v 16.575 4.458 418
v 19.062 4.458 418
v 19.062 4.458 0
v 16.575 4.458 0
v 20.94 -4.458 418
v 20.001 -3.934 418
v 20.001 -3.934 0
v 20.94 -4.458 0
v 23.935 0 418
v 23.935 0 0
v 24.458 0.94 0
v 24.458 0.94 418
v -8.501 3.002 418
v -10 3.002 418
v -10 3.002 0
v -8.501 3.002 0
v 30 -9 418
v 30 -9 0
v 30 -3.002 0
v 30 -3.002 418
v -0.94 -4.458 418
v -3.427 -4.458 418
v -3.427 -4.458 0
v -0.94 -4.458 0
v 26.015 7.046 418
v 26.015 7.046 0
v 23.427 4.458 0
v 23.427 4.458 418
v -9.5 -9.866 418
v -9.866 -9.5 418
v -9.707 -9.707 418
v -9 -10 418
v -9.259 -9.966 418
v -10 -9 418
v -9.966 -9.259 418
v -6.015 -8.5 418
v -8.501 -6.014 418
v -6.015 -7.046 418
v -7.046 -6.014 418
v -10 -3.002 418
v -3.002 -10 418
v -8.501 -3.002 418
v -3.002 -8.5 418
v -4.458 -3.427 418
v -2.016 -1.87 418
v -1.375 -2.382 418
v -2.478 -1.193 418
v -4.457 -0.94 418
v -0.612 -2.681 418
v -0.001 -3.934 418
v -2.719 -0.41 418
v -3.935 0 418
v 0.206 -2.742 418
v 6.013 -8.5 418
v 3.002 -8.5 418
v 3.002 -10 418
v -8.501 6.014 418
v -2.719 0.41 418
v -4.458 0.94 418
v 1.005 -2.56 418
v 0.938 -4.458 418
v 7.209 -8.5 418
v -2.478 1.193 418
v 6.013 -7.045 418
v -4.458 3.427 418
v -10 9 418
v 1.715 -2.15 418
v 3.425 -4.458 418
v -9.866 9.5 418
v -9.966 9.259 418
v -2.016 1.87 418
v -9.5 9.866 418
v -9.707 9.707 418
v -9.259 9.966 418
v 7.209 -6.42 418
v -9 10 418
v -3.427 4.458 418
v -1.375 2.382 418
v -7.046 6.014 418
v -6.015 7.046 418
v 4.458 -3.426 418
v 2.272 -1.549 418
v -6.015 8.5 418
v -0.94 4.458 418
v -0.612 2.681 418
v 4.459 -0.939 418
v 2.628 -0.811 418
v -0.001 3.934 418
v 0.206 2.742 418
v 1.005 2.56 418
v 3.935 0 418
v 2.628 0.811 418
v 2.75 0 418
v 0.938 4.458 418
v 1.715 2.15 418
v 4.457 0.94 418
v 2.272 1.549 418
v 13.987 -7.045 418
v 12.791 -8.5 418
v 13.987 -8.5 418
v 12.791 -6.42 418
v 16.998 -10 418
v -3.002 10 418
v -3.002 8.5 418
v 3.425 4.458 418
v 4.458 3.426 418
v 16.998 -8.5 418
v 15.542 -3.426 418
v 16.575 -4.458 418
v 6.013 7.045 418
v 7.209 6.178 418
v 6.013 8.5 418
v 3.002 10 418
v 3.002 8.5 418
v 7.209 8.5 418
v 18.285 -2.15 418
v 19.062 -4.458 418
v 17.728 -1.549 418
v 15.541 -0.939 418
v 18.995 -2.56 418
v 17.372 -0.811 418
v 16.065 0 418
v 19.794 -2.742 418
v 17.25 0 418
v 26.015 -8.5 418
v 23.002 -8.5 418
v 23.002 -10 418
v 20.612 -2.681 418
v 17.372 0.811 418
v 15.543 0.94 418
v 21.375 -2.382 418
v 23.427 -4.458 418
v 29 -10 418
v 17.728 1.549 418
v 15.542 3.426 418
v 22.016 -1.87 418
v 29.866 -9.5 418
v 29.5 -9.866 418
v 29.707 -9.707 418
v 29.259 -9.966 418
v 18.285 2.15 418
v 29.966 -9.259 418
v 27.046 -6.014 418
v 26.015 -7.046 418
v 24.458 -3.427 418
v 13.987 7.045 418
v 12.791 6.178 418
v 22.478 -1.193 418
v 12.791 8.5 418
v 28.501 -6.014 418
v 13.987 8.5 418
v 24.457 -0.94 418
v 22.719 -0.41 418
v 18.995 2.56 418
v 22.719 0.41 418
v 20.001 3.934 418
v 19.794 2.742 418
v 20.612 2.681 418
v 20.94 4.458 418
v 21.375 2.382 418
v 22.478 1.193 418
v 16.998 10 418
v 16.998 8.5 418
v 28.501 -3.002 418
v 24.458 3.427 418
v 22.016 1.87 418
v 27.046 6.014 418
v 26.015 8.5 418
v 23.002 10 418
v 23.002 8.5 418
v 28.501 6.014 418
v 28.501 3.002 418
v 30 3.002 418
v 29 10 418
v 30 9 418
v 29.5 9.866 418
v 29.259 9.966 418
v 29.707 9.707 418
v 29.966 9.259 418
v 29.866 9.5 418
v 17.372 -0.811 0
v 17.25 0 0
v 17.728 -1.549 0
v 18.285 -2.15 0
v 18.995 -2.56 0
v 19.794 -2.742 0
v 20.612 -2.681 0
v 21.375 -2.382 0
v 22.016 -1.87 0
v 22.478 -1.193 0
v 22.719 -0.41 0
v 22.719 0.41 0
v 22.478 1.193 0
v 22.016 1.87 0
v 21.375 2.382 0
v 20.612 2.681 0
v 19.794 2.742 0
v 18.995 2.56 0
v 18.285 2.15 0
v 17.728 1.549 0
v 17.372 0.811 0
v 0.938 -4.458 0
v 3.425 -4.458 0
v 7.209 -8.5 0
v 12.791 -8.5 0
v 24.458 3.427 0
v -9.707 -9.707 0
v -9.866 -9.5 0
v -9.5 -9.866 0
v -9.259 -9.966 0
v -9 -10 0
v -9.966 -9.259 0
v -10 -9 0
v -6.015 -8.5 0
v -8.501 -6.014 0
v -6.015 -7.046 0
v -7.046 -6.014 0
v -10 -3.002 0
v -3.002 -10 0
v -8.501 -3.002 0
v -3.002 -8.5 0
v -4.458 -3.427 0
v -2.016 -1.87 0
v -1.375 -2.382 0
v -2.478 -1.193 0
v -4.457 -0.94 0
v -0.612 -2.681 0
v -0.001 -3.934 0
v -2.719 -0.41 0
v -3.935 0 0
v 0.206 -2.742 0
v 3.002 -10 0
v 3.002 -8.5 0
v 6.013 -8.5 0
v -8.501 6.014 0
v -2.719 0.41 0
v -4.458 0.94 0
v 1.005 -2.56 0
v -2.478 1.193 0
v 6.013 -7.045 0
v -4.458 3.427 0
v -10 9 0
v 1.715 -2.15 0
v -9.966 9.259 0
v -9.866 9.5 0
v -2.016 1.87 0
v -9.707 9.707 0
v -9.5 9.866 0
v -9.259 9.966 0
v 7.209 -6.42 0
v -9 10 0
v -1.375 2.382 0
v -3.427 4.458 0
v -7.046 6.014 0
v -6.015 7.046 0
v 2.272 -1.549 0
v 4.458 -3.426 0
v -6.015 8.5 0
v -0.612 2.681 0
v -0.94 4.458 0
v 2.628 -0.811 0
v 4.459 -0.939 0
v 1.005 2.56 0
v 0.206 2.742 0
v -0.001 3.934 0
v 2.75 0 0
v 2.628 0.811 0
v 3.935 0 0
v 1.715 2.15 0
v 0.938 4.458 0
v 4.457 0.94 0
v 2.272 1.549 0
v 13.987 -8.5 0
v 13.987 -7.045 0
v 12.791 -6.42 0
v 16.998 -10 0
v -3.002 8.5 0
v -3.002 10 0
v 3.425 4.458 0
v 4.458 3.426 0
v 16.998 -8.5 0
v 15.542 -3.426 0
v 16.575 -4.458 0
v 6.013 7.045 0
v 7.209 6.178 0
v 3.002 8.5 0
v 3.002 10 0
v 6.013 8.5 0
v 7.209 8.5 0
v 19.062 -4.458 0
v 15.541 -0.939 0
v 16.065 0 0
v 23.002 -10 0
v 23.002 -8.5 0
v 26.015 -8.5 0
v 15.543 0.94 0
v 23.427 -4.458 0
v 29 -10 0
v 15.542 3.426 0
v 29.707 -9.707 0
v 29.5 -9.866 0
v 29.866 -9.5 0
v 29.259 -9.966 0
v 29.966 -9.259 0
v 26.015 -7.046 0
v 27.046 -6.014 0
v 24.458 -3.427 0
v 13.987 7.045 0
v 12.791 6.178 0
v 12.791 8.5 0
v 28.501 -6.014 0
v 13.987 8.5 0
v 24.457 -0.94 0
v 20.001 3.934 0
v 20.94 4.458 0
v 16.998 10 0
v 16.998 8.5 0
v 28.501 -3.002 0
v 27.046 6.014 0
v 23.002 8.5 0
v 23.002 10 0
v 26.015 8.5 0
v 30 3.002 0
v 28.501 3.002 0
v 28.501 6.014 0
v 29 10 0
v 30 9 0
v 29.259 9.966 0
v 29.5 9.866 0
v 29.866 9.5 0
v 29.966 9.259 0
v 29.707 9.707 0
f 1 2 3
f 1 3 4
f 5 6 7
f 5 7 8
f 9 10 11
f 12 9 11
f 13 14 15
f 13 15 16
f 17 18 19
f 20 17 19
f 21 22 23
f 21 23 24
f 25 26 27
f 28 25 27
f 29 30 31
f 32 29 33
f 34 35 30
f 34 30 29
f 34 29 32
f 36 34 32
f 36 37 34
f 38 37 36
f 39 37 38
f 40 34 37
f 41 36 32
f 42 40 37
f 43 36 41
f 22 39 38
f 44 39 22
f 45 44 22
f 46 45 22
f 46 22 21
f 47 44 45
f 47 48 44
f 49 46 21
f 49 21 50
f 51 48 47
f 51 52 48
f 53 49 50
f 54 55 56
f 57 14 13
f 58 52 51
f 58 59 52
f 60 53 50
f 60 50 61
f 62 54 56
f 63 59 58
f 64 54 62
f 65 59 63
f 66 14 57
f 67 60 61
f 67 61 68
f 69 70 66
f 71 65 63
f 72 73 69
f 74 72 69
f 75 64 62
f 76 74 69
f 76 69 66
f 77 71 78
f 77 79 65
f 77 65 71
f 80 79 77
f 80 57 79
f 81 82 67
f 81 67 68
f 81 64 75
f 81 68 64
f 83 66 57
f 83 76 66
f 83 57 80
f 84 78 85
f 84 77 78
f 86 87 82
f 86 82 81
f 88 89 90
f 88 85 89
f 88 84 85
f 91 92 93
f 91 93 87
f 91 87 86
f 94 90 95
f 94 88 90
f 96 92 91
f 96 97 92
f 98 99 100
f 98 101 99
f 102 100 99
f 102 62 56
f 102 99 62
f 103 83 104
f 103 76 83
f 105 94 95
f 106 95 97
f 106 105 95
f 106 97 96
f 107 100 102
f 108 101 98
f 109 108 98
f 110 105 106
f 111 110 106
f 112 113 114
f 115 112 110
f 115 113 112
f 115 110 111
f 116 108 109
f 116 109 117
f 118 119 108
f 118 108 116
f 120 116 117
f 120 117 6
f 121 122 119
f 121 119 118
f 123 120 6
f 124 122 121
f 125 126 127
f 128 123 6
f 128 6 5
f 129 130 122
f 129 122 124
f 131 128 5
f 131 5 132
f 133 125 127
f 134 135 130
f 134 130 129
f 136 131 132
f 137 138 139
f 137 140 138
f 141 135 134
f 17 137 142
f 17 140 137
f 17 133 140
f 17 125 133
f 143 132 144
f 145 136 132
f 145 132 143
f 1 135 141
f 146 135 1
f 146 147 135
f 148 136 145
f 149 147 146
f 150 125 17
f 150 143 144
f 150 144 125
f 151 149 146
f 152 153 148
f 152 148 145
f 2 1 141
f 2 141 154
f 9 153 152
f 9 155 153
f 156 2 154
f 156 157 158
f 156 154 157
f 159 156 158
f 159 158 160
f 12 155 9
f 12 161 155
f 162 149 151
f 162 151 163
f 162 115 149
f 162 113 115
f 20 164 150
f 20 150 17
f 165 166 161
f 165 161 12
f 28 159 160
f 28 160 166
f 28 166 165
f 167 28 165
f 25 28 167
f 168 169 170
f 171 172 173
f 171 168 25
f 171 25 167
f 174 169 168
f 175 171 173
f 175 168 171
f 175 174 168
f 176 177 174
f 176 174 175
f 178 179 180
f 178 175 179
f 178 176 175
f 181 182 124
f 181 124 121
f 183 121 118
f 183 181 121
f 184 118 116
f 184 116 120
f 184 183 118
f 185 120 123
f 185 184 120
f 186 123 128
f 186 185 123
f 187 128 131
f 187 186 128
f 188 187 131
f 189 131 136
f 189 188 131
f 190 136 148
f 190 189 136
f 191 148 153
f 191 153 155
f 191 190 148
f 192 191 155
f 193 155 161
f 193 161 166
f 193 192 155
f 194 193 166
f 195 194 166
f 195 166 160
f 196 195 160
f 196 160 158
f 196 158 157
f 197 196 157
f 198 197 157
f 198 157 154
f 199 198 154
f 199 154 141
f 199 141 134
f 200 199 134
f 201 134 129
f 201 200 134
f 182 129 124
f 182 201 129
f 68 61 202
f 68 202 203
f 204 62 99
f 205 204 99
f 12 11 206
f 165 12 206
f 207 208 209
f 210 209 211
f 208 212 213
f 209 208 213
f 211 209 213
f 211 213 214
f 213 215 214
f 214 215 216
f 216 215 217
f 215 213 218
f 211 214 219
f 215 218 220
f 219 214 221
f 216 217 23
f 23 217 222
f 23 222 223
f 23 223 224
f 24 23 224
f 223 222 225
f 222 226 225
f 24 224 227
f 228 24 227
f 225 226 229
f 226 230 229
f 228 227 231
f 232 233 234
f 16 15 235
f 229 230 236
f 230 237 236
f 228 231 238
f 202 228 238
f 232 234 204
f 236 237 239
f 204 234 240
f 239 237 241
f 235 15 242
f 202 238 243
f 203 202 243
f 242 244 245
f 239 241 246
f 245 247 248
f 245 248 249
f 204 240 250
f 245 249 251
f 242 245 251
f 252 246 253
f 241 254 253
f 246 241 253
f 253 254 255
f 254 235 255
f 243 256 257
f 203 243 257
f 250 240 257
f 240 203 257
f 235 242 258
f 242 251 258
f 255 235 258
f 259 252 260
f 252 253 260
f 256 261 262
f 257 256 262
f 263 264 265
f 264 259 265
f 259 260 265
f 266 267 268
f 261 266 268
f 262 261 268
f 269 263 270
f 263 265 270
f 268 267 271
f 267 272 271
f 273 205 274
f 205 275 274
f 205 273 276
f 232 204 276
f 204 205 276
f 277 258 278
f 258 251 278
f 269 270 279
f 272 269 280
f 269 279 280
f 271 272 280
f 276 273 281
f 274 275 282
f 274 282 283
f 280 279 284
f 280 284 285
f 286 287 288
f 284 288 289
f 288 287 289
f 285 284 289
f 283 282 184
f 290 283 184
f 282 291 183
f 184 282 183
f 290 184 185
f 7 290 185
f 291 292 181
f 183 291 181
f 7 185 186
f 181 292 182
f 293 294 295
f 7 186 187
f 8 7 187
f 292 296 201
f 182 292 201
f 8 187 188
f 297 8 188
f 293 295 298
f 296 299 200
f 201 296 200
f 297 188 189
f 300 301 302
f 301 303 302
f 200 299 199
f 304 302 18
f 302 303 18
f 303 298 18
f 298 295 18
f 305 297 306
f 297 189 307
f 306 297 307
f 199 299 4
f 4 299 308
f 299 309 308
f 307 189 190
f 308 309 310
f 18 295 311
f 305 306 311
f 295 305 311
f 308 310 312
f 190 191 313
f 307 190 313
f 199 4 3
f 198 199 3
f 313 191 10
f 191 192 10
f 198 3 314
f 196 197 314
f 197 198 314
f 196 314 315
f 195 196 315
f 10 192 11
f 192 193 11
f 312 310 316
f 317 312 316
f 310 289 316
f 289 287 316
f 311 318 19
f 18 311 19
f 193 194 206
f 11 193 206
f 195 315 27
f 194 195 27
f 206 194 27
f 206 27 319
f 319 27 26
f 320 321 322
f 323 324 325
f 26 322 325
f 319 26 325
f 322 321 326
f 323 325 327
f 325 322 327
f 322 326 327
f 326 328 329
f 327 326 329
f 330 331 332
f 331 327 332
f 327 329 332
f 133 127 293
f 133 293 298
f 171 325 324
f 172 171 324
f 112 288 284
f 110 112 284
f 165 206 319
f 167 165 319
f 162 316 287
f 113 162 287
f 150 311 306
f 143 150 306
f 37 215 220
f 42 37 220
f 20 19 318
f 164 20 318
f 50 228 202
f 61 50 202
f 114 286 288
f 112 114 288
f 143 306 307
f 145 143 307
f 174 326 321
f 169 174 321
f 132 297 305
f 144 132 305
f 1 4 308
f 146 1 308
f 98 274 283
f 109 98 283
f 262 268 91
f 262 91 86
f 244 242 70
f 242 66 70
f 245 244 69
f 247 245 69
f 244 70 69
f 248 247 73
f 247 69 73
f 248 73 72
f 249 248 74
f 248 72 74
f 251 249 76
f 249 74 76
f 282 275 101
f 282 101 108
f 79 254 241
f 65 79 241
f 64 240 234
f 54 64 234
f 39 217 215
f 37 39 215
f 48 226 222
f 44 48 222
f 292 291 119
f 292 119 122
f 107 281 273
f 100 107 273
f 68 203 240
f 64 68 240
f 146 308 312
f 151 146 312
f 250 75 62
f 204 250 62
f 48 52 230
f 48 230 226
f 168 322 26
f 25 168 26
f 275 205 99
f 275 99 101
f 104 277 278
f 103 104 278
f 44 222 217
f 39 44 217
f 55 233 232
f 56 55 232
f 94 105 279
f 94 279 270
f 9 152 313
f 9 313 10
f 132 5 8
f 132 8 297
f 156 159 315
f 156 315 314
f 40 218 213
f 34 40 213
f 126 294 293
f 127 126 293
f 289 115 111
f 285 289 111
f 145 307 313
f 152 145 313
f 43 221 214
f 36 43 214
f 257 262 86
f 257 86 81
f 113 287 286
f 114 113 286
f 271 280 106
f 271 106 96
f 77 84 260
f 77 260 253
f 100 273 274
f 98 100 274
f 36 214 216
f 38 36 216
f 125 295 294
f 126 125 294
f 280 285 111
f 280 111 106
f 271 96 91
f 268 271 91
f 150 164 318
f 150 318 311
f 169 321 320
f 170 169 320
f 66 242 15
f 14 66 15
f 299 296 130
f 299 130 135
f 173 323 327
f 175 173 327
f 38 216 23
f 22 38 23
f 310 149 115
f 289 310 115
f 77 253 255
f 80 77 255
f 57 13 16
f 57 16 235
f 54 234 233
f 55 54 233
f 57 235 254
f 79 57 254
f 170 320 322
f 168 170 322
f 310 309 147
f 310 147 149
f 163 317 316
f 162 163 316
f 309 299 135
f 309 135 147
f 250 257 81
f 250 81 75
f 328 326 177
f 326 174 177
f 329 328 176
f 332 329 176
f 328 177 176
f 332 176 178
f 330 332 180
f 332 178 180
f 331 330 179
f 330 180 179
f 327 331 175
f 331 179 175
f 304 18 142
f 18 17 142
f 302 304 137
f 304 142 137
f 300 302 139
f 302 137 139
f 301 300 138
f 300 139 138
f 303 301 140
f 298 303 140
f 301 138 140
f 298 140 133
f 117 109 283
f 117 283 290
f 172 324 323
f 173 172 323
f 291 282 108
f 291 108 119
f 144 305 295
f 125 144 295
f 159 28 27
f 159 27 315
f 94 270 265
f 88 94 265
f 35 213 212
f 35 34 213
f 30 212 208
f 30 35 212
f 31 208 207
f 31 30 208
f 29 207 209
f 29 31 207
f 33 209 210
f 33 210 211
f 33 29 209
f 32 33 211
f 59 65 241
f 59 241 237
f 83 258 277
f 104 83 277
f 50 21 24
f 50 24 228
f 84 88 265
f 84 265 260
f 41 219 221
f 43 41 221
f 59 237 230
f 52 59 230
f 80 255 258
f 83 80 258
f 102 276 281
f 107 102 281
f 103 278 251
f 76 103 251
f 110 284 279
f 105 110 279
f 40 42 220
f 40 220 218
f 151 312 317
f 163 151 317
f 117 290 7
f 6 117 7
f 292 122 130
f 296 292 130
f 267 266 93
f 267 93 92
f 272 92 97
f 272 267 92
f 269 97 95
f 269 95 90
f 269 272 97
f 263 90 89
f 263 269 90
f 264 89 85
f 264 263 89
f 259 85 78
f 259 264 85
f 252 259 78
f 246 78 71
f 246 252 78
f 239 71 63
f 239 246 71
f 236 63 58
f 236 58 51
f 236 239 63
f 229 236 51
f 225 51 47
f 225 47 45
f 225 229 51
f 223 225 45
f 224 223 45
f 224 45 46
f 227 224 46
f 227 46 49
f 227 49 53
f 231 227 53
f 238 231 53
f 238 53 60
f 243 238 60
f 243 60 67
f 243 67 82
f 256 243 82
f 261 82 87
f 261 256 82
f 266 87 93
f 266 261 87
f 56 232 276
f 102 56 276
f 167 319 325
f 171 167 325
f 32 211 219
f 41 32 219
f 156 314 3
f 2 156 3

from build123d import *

# Parameters (mm, degrees)
SKETCH1_R           = 2.75
BOSS_EXTRUDE1_DEPTH = 418
FILLET2_R           = 1
FILLET4_R           = 1
FILLET5_R           = 1
FILLET6_R           = 1


with BuildPart() as part:
    # Sketch1 → Boss-Extrude1 (new body)
    with BuildSketch(Plane.XY):
        Polygon((-3.001792446, 10), (-10, 10), (-10, 3.001792446), (-8.500771543, 3.001792446), (-8.500771543, 6.014407427), (-7.045753692, 6.014407427), (-4.458187435, 3.426841169), (-4.458187435, 0.939646666), (-3.934715846, 0), (-4.45749106, -0.939646666), (-4.458187435, -3.426841169), (-7.045753692, -6.014407427), (-8.500771543, -6.014407427), (-8.500771543, -3.001792446), (-10, -3.001792446), (-10, -10), (-3.001792446, -10), (-3.001792446, -8.499999951), (-6.014791508, -8.499999951), (-6.014791508, -7.045753643), (-3.427225251, -4.458187385), (-0.939604714, -4.458187385), (-0.00108721, -3.933944043), (0.937618184, -4.457850876), (3.425238721, -4.457850876), (6.012804978, -7.045417133), (6.012804978, -8.500000007), (3.001792545, -8.500000007), (3.001792545, -10), (16.998207455, -10), (16.998207455, -8.500000007), (13.987195022, -8.500000007), (13.987195022, -7.045417133), (16.574761279, -4.457850876), (19.062381816, -4.457850876), (20.00108721, -3.933944043), (20.939604714, -4.458187385), (23.427225251, -4.458187385), (26.014791508, -7.045753643), (26.014791508, -8.499999951), (23.001792446, -8.499999951), (23.001792446, -10), (30, -10), (30, -3.001792446), (28.500771543, -3.001792446), (28.500771543, -6.014407427), (27.045753692, -6.014407427), (24.458187435, -3.426841169), (24.45749106, -0.939646666), (23.934715846, 0), (24.458187435, 0.939646666), (24.458187435, 3.426841169), (27.045753692, 6.014407427), (28.500771543, 6.014407427), (28.500771543, 3.001792446), (30, 3.001792446), (30, 10), (23.001792446, 10), (23.001792446, 8.499999951), (26.014791508, 8.499999951), (26.014791508, 7.045753643), (23.427225251, 4.458187385), (20.939604714, 4.458187385), (20.00108721, 3.933944043), (19.062381816, 4.457850876), (16.574761279, 4.457850876), (13.987195022, 7.045417133), (13.987195022, 8.499999951), (16.998207356, 8.499999951), (16.998207356, 10), (3.001792643, 10), (3.001792643, 8.499999951), (6.012804978, 8.499999951), (6.012804978, 7.045417133), (3.425238721, 4.457850876), (0.937618184, 4.457850876), (-0.00108721, 3.933944043), (-0.939604714, 4.458187385), (-3.427225251, 4.458187385), (-6.014791508, 7.045753643), (-6.014791508, 8.499999951), (-3.001792446, 8.499999951), align=None)
        Circle(SKETCH1_R, mode=Mode.SUBTRACT)
        with Locations(Location((20, 0, 0), (0, 0, 180))):
            Circle(SKETCH1_R, mode=Mode.SUBTRACT)
        Polygon((7.208733292, -6.419793455), (7.208733292, -8.500000007), (12.791266708, -8.500000007), (12.791266708, -6.419793455), (15.541654987, -3.426231961), (15.541209058, -0.938611464), (16.065284154, 0), (15.54250894, 0.939646666), (15.541655044, 3.426231961), (12.791266708, 6.17760654), (12.791266708, 8.499999951), (7.208733292, 8.499999951), (7.208733292, 6.17760654), (4.458344956, 3.426231961), (4.45749106, 0.939646666), (3.934715846, 0), (4.458790942, -0.938611464), (4.458345013, -3.426231961), align=None, mode=Mode.SUBTRACT)
    extrude(amount=BOSS_EXTRUDE1_DEPTH)

    # Fillet2
    fillet2_edges = [part.edges().sort_by_distance(p)[0] for p in [
        (-10, -10, 209),
    ]]
    fillet(fillet2_edges, radius=FILLET2_R)

    # Fillet4
    fillet4_edges = [part.edges().sort_by_distance(p)[0] for p in [
        (-10, 10, 209),
    ]]
    fillet(fillet4_edges, radius=FILLET4_R)

    # Fillet5
    fillet5_edges = [part.edges().sort_by_distance(p)[0] for p in [
        (30, 10, 209),
    ]]
    fillet(fillet5_edges, radius=FILLET5_R)

    # Fillet6
    fillet6_edges = [part.edges().sort_by_distance(p)[0] for p in [
        (30, -10, 209),
    ]]
    fillet(fillet6_edges, radius=FILLET6_R)


solid = part.part
